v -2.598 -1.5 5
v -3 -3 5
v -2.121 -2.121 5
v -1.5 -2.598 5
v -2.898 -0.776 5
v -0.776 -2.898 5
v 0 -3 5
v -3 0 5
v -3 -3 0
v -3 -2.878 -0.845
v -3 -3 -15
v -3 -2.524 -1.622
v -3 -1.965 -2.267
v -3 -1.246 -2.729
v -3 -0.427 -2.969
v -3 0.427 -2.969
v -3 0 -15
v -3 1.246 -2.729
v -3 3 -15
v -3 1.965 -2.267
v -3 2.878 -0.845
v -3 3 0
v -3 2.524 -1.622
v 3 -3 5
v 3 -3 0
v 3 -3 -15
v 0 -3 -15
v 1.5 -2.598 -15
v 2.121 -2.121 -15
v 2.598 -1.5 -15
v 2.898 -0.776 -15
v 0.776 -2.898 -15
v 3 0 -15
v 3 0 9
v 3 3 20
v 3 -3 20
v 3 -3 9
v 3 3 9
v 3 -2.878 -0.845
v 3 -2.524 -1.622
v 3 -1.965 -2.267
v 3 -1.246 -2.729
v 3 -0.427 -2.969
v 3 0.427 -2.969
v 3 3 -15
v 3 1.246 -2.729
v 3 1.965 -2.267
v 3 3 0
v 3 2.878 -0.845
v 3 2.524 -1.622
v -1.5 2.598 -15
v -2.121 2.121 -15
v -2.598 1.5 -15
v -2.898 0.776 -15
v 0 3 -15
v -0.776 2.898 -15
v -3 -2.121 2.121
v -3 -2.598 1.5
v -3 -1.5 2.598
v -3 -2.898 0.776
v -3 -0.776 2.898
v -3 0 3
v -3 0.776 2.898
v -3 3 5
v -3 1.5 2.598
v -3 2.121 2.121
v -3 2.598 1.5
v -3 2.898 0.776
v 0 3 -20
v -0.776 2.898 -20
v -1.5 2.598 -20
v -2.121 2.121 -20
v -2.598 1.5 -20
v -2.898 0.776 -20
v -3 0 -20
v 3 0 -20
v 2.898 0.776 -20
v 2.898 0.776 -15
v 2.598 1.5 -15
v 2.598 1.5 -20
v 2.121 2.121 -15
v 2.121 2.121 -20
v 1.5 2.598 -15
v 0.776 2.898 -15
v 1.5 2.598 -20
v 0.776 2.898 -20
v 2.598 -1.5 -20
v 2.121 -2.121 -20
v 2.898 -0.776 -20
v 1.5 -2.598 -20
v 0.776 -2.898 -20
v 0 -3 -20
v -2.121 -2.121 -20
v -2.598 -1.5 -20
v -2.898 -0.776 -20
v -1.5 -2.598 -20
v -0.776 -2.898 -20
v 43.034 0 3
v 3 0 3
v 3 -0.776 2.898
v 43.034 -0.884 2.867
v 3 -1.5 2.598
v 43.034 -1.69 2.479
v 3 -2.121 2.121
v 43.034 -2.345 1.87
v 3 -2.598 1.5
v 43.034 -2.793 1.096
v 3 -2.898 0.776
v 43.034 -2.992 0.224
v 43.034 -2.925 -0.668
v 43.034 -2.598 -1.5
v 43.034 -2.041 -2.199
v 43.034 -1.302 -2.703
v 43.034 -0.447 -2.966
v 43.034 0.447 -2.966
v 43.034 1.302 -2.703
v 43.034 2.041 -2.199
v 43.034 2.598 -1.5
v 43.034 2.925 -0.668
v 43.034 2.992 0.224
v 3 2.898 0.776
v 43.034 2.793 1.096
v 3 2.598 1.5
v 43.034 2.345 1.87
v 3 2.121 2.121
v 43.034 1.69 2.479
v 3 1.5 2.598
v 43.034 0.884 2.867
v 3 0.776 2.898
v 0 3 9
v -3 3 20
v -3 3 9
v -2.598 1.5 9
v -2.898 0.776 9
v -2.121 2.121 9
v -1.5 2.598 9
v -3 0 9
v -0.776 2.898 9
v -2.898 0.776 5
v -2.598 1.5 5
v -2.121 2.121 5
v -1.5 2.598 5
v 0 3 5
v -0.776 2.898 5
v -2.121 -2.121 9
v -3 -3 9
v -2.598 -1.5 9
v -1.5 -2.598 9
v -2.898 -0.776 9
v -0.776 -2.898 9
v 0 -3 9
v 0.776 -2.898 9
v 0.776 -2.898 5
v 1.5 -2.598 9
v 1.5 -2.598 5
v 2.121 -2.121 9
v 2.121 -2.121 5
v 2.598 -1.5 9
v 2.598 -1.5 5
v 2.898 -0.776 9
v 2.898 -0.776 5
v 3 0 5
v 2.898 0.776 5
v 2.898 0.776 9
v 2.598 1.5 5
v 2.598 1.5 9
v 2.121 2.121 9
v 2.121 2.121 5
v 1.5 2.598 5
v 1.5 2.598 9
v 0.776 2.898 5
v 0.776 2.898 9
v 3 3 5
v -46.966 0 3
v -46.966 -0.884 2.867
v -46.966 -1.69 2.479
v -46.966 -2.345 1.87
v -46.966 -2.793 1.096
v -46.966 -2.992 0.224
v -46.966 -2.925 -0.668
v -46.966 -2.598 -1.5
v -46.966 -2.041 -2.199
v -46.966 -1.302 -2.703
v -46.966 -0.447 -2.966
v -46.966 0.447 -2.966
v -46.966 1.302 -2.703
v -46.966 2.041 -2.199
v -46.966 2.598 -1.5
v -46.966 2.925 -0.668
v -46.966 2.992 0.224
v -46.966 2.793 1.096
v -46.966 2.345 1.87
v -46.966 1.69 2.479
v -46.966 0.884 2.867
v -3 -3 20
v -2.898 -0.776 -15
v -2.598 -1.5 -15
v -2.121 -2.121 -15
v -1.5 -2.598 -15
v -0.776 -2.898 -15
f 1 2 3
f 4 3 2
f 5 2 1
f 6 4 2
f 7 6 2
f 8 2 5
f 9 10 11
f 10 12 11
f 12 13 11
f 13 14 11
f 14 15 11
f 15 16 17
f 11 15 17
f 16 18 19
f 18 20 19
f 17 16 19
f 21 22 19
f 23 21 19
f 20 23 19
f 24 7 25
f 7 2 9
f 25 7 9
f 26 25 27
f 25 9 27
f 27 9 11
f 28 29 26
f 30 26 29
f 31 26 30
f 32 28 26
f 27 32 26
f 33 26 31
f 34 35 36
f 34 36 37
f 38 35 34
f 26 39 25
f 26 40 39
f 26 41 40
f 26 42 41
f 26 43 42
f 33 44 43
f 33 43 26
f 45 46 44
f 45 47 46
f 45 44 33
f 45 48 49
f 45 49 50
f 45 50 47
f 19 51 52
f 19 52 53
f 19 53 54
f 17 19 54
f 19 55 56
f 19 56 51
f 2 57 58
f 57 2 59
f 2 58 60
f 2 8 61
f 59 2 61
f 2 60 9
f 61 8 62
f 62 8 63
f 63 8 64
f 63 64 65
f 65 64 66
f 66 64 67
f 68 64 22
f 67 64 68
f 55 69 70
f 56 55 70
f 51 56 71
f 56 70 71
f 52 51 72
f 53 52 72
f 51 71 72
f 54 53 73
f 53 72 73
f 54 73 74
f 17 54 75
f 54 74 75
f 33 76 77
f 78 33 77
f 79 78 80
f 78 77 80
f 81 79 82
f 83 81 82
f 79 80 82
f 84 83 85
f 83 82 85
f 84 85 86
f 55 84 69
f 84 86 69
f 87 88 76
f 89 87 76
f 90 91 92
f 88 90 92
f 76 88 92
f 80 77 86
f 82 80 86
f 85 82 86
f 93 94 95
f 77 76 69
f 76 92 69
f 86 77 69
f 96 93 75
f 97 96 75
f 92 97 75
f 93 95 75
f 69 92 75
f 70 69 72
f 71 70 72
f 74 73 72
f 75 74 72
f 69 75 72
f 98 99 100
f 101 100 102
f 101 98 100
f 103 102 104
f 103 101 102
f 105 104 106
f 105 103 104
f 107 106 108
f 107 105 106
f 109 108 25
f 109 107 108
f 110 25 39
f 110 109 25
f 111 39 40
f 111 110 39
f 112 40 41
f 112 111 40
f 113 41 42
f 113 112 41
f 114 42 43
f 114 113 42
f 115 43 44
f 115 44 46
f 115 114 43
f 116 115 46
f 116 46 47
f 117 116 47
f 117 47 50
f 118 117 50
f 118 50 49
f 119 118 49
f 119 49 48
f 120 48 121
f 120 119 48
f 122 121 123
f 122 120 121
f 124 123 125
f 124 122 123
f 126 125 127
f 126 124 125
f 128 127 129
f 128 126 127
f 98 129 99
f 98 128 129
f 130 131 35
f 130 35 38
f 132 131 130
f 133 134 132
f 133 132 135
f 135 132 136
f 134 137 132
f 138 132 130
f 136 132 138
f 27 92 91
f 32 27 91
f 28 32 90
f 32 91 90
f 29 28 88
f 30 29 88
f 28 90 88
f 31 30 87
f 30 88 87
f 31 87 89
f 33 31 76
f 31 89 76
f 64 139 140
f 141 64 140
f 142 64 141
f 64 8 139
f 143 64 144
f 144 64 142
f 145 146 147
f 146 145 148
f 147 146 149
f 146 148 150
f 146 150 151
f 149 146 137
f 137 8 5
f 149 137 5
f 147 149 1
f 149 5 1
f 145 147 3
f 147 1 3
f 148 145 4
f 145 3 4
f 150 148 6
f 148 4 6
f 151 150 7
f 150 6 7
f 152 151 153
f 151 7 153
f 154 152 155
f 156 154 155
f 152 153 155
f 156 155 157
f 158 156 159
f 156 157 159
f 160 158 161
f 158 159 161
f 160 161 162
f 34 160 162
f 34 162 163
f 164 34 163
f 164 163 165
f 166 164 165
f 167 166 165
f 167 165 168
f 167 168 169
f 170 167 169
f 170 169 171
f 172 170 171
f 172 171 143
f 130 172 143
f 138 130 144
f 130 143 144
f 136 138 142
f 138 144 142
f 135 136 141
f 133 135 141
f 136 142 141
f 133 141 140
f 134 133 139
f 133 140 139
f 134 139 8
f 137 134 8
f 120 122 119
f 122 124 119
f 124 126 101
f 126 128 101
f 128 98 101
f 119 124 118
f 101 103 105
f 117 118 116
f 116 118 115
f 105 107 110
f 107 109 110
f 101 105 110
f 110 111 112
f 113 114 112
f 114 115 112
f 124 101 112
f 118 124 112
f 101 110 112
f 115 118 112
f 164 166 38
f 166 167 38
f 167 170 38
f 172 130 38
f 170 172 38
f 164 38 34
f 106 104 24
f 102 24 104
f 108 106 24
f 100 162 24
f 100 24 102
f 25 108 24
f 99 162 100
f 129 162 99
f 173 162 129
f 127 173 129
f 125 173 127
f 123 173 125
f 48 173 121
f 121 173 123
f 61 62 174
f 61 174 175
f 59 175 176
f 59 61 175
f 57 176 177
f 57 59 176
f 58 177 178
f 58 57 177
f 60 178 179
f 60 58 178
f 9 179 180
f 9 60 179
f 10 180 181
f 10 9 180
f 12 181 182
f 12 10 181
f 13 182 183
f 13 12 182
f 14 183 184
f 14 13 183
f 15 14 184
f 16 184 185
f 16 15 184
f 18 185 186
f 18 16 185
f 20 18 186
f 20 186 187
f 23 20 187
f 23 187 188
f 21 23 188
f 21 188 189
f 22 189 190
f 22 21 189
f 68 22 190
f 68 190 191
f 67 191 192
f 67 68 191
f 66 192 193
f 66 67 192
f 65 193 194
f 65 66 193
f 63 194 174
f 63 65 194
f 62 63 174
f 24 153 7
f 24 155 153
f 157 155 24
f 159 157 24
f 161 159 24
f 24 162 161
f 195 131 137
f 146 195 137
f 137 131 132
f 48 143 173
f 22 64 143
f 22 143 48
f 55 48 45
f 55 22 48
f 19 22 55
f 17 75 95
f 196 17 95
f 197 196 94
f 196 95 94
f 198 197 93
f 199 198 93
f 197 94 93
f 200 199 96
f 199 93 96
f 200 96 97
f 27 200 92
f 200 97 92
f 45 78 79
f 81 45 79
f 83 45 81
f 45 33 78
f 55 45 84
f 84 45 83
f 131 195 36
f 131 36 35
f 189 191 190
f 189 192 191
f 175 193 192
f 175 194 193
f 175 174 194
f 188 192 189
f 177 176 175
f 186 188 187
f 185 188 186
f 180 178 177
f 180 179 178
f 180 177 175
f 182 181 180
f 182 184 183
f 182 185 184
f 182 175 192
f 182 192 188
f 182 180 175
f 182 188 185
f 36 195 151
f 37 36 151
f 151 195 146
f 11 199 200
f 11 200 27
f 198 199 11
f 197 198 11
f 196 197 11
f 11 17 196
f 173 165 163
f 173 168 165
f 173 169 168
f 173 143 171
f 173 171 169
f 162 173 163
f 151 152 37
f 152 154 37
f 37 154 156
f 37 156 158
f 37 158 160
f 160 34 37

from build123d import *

# Parameters (mm, degrees)
SKETCH_1_W               = 90
SKETCH_1_H               = 3
EXTRUDE_1_DEPTH          = 3
EXTRUDE_1_DEPTH_BACK     = 3
SKETCH_2_W               = 40
SKETCH_2_H               = 6
CUT_EXTRUDE_1_DEPTH      = 5
CUT_EXTRUDE_5_DEPTH      = 1
CUT_EXTRUDE_5_DEPTH_BACK = 3
SKETCH_4_OUTSIDE_W       = 111.734
SKETCH_4_OUTSIDE_H       = 27.734
SKETCH_4_OUTSIDE_R       = 3


with BuildPart() as part:
    # 草图1 → 旋转1 (revolve)
    with BuildSketch(Plane.XY, mode=Mode.PRIVATE) as revolve_1_sk:
        with Locations((-1.966019417, 1.5)):
            Rectangle(SKETCH_1_W, SKETCH_1_H)
    revolve(revolve_1_sk.sketch.rotate(Axis((-46.966019417, 0, 0), (1, 0, 0)), 90), axis=Axis((-46.966019417, 0, 0), (1, 0, 0)))

    # 草图2 → 凸台-拉伸1 (add, two sides: drawn at the far end of the back side and taken through both)
    with BuildSketch(Plane(origin=(0, 0, 0), x_dir=(0, 0, -1), z_dir=(1, 0, 0)).offset(-EXTRUDE_1_DEPTH_BACK)):
        Rectangle(SKETCH_2_W, SKETCH_2_H)
    extrude(amount=EXTRUDE_1_DEPTH + EXTRUDE_1_DEPTH_BACK)

    # 草图3 → 切除-拉伸1 (cut)
    with BuildSketch(Plane(origin=(0, 0, -20), x_dir=(-1, 0, 0), z_dir=(0, 0, -1))):
        with BuildLine():
            Line((-3, 3), (-3, 0))
            ThreePointArc((-3, 0), (-2.121320344, 2.121320344), (0, 3))
            Line((0, 3), (-3, 3))
        make_face()
        with BuildLine():
            ThreePointArc((0, 3), (2.121320344, 2.121320344), (3, 0))
            Line((3, 0), (3, 3))
            Line((3, 3), (0, 3))
        make_face()
        with BuildLine():
            Line((-3, -3), (0, -3))
            ThreePointArc((0, -3), (-2.121320344, -2.121320344), (-3, 0))
            Line((-3, 0), (-3, -3))
        make_face()
        with BuildLine():
            Line((0, -3), (3, -3))
            Line((3, -3), (3, 0))
            ThreePointArc((3, 0), (2.121320344, -2.121320344), (0, -3))
        make_face()
    extrude(amount=-CUT_EXTRUDE_1_DEPTH, mode=Mode.SUBTRACT)

    # 草图4 outside → 切除-拉伸5 (cut, two sides: drawn at the far end of the back side and taken through both)
    with BuildSketch(Plane.XY.offset(8).offset(-CUT_EXTRUDE_5_DEPTH_BACK)):
        with Locations((-1.966, 0)):
            Rectangle(SKETCH_4_OUTSIDE_W, SKETCH_4_OUTSIDE_H)
        with Locations(Location((0, 0, 0), (0, 0, 180))):
            Circle(SKETCH_4_OUTSIDE_R, mode=Mode.SUBTRACT)
    extrude(amount=CUT_EXTRUDE_5_DEPTH + CUT_EXTRUDE_5_DEPTH_BACK, mode=Mode.SUBTRACT)


solid = part.part
